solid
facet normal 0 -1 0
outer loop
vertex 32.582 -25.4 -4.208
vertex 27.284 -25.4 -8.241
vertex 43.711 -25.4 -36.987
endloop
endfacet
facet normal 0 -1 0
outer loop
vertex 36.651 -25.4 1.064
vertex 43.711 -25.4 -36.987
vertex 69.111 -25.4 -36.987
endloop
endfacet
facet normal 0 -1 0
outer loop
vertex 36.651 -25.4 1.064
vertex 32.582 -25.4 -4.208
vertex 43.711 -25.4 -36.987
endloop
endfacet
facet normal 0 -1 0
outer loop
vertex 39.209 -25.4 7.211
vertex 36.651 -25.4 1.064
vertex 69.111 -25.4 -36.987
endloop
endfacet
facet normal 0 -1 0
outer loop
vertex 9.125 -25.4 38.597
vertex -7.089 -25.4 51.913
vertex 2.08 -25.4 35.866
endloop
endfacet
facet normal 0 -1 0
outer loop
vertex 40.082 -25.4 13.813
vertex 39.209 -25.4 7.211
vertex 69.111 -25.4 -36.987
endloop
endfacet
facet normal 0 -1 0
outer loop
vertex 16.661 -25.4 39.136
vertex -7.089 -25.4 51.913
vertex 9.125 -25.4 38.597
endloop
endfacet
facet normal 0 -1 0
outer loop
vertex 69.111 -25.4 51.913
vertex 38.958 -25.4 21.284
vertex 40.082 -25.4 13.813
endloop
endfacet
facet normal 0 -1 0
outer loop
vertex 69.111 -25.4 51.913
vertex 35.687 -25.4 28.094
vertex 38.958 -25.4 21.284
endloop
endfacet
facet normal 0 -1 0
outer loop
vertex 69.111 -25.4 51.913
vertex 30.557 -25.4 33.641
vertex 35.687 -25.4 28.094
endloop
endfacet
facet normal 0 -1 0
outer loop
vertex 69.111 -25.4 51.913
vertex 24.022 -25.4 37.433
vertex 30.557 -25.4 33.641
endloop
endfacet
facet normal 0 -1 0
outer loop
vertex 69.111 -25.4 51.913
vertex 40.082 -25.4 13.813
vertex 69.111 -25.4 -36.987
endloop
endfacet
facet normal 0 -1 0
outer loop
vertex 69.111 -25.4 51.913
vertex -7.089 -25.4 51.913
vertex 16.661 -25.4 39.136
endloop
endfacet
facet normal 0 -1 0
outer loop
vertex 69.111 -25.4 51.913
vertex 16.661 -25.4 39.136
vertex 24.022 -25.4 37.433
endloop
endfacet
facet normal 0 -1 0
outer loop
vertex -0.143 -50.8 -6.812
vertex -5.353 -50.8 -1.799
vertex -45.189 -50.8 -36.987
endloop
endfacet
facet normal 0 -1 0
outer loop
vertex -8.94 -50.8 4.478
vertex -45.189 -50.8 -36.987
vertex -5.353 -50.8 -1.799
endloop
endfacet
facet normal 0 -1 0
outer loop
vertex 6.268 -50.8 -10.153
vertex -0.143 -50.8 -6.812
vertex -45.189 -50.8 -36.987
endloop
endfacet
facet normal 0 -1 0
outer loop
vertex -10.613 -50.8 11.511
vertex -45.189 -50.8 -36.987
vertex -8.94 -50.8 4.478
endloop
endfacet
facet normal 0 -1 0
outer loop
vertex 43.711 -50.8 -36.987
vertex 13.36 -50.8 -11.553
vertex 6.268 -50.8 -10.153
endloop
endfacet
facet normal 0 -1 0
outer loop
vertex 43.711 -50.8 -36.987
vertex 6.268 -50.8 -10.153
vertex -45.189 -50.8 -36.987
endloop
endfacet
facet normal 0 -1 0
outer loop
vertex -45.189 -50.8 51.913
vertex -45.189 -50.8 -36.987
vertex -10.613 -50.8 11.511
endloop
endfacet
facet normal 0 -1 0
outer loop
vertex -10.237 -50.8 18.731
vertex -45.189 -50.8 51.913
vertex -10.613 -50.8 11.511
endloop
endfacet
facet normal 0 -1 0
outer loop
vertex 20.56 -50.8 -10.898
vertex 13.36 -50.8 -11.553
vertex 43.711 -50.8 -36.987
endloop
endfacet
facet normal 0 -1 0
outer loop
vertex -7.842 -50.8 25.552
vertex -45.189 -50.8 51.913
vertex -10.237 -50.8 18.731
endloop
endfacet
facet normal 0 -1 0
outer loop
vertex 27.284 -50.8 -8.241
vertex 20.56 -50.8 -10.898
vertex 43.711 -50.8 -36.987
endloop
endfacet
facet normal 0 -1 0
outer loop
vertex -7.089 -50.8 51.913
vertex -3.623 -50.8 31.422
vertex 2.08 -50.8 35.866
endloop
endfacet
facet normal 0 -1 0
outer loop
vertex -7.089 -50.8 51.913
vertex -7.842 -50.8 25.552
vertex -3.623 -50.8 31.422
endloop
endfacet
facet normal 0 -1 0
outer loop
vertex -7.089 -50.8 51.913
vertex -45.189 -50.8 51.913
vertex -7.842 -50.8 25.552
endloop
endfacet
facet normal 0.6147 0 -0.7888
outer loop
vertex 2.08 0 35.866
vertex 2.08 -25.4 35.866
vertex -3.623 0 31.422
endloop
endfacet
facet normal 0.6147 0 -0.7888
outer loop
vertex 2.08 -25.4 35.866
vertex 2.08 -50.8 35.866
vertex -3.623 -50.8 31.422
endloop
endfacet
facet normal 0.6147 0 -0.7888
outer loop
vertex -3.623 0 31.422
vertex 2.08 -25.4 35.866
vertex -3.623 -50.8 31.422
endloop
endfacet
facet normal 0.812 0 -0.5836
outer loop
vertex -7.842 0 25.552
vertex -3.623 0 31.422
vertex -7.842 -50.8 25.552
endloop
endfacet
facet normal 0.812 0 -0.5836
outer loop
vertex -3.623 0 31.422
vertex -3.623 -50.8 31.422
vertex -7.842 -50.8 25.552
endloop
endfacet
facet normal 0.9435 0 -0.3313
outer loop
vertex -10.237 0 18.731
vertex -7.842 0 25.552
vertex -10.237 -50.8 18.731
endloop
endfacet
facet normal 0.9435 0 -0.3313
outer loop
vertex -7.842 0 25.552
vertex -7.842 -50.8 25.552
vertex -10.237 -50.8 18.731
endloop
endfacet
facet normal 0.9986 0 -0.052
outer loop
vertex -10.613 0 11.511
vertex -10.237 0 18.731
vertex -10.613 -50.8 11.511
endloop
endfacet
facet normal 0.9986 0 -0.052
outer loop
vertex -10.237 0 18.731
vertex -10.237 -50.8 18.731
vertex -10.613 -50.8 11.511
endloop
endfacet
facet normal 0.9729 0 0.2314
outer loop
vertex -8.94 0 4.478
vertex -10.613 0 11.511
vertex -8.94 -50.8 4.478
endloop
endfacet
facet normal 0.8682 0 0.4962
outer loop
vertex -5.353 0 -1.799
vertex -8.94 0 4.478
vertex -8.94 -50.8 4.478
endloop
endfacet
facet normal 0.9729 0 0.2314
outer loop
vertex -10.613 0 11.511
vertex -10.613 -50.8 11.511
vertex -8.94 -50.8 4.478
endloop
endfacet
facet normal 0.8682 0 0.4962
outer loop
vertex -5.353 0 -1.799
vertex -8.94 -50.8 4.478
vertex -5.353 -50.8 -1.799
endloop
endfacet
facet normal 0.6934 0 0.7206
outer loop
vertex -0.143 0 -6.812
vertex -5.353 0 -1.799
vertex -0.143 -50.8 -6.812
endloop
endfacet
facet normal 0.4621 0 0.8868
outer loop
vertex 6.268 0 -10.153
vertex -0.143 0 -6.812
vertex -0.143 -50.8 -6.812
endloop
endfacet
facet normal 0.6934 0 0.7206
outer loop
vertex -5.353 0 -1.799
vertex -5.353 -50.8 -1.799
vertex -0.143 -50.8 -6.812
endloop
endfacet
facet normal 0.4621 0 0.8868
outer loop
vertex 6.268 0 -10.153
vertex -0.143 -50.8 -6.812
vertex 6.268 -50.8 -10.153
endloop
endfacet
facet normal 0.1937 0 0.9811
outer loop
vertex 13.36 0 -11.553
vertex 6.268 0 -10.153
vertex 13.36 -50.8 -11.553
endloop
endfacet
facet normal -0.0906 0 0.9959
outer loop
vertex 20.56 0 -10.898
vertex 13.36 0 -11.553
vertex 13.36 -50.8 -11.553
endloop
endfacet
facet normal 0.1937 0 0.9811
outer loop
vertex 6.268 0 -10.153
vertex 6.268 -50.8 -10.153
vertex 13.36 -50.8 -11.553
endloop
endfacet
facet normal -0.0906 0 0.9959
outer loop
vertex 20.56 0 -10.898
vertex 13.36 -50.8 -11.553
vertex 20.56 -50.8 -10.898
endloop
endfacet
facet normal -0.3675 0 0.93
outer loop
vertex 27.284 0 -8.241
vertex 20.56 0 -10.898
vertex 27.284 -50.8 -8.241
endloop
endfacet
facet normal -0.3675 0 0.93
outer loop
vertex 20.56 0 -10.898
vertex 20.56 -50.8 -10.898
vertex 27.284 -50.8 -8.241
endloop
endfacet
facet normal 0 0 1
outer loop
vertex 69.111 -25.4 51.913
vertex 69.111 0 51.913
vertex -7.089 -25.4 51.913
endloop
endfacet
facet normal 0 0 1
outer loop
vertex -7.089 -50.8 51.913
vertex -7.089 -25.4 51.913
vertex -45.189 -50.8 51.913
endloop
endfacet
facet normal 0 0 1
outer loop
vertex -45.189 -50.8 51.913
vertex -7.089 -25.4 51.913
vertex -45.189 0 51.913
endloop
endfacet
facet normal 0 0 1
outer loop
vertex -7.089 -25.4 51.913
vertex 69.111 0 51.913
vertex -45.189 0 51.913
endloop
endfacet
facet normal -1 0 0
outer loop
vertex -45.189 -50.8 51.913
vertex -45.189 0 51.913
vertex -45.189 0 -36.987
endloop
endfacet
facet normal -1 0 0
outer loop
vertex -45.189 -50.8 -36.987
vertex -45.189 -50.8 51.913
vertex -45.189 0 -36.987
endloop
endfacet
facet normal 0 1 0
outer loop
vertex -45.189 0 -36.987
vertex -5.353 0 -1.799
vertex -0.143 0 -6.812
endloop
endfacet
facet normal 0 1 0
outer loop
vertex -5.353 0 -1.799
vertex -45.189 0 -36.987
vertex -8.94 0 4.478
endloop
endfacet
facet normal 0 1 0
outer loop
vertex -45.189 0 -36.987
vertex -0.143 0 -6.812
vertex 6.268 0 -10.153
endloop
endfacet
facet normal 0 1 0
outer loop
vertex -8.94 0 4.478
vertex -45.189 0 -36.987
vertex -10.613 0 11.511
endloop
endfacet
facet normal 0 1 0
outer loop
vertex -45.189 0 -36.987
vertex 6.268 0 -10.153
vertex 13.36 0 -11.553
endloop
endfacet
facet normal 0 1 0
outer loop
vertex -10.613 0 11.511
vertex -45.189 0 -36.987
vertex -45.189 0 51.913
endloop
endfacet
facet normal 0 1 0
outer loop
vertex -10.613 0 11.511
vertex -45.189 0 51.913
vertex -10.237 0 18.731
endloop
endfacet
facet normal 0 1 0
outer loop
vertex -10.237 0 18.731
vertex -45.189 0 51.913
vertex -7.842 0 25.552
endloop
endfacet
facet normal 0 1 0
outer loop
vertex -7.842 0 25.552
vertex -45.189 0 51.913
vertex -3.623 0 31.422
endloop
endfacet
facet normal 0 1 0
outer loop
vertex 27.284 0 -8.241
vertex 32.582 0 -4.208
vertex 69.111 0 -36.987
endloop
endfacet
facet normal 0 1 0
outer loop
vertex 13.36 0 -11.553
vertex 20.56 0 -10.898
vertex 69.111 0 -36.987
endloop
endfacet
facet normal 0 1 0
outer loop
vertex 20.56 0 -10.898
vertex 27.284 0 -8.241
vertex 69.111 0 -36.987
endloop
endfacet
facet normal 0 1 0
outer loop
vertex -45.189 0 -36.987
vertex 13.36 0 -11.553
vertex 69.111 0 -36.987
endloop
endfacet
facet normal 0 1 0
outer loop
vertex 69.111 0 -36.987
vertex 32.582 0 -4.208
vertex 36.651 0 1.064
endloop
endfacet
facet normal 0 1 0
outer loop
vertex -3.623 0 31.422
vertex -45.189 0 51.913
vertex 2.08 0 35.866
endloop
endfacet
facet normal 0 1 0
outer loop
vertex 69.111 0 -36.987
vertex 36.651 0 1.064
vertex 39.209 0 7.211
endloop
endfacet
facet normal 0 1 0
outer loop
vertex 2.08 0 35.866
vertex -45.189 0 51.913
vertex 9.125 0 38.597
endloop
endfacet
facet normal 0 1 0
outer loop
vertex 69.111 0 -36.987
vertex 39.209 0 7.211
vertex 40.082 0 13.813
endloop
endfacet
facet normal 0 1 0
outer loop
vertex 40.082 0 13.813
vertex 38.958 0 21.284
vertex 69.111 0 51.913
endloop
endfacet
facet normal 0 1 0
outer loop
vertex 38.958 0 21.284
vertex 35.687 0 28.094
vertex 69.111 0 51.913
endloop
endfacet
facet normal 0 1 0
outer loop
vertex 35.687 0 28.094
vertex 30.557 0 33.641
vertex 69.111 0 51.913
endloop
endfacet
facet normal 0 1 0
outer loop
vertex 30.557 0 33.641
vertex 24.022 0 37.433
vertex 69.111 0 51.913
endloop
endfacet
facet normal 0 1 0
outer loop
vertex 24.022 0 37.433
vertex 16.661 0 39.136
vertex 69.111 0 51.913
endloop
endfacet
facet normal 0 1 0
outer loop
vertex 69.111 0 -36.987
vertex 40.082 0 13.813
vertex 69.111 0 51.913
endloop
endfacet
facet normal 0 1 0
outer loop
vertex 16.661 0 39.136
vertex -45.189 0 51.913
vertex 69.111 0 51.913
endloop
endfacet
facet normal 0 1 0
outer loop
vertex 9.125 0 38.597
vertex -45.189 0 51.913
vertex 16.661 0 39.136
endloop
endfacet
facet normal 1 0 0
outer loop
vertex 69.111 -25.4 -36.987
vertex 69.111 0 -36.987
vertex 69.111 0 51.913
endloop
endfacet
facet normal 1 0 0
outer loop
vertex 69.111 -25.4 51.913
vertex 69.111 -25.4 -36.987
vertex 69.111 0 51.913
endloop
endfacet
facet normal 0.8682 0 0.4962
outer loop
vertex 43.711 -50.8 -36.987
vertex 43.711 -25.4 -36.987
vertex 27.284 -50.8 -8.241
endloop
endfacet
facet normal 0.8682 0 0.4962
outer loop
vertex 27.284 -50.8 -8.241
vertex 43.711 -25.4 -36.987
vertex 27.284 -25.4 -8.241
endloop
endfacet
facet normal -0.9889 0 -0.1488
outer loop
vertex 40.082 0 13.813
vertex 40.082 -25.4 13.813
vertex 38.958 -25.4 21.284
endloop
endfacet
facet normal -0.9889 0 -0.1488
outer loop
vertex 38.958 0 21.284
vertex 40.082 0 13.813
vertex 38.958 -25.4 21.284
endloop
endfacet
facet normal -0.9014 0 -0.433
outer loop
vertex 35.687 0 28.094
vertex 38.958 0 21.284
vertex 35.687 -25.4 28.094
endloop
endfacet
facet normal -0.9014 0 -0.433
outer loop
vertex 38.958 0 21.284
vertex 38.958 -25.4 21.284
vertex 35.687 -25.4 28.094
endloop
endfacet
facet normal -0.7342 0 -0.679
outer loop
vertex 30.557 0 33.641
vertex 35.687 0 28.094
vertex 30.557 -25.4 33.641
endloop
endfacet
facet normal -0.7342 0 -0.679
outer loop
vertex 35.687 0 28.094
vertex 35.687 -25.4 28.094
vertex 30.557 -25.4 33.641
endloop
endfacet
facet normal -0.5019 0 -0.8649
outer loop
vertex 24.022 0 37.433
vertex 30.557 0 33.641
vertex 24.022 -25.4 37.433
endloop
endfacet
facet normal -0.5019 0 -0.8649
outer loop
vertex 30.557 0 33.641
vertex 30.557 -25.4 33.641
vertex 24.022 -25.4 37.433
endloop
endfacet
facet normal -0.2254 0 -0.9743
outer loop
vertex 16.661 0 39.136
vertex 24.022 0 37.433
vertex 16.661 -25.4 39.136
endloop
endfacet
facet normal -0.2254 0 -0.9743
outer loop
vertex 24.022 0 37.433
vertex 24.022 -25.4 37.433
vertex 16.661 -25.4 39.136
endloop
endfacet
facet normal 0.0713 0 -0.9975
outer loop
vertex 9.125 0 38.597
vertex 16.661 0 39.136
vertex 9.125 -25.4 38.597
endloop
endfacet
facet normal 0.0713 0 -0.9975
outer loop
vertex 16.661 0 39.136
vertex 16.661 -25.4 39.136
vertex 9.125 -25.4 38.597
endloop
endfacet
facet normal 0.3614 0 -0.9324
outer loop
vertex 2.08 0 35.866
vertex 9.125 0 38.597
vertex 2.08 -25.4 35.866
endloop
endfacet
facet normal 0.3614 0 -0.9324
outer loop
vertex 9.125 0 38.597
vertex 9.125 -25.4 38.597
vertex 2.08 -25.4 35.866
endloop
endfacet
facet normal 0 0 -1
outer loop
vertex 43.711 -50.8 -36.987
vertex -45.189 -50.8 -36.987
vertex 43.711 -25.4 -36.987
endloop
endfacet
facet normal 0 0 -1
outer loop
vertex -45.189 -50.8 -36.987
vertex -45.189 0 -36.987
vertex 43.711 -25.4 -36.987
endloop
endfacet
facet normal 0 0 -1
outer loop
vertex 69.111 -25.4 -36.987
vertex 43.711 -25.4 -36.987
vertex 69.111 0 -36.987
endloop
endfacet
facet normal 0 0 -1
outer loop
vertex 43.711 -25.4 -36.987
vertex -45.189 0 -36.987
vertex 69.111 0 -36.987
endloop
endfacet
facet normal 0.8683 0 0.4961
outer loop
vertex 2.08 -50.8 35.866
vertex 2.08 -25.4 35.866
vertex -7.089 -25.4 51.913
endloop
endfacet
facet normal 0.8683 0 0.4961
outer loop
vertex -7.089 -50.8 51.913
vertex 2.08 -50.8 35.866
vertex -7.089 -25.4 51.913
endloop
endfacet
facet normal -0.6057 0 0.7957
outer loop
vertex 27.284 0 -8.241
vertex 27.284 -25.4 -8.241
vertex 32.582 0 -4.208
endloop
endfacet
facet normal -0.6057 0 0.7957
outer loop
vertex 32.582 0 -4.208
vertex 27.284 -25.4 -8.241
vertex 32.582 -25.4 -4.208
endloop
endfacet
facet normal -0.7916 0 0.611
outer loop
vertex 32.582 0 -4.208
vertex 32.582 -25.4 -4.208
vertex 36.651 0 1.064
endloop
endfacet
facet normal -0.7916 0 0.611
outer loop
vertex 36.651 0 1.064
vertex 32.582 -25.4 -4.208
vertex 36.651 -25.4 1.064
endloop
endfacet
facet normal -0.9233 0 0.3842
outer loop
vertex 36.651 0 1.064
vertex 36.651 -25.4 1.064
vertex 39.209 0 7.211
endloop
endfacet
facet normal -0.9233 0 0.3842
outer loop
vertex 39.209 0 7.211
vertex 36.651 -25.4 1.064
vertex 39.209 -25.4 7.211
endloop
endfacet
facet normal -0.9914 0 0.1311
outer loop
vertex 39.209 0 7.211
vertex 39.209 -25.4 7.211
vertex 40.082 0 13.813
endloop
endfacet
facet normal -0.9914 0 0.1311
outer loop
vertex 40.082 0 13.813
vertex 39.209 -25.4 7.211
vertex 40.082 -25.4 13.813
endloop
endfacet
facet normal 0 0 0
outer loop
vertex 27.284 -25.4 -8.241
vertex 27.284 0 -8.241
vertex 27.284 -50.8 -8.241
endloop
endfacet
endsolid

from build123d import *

# Parameters (mm, degrees)
F0_W     = 114.3
F0_H     = 88.9
F1_DEPTH = 25.4
F3_DEPTH = 25.4
F5_DEPTH = 50.8


with BuildPart() as f1:
    # F0 (on Front) → F1 (new body)
    with BuildSketch(Plane.XZ):
        with Locations((11.960601, 7.462785)):
            Rectangle(F0_W, F0_H)
    extrude(amount=F1_DEPTH)

    # F2 (on face) → F3 (join)
    with BuildSketch(Plane.XZ.offset(25.4)):
        Polygon((-45.189399, 51.912785), (-45.189399, -36.987215), (43.710601, -36.987215), (-7.089399, 51.912785), align=None)
    extrude(amount=F3_DEPTH)

    # F4 (on face) → F5 (cut)
    with BuildSketch(Plane.XZ.offset(50.8)):
        with BuildLine():
            ThreePointArc((27.283958, -8.240591), (36.650746, 1.063844), (40.082029, 13.812785))
            ThreePointArc((40.082029, 13.812785), (27.43097, 35.781501), (2.0801, 35.866161))
            Line((2.0801, 35.866161), (27.283958, -8.240591))
        make_face()
        with BuildLine():
            Line((27.283958, -8.240591), (2.0801, 35.866161))
            ThreePointArc((2.0801, 35.866161), (-7.371347, 1.210856), (27.283958, -8.240591))
        make_face()
    extrude(amount=-F5_DEPTH, mode=Mode.SUBTRACT)


solid = f1.part
